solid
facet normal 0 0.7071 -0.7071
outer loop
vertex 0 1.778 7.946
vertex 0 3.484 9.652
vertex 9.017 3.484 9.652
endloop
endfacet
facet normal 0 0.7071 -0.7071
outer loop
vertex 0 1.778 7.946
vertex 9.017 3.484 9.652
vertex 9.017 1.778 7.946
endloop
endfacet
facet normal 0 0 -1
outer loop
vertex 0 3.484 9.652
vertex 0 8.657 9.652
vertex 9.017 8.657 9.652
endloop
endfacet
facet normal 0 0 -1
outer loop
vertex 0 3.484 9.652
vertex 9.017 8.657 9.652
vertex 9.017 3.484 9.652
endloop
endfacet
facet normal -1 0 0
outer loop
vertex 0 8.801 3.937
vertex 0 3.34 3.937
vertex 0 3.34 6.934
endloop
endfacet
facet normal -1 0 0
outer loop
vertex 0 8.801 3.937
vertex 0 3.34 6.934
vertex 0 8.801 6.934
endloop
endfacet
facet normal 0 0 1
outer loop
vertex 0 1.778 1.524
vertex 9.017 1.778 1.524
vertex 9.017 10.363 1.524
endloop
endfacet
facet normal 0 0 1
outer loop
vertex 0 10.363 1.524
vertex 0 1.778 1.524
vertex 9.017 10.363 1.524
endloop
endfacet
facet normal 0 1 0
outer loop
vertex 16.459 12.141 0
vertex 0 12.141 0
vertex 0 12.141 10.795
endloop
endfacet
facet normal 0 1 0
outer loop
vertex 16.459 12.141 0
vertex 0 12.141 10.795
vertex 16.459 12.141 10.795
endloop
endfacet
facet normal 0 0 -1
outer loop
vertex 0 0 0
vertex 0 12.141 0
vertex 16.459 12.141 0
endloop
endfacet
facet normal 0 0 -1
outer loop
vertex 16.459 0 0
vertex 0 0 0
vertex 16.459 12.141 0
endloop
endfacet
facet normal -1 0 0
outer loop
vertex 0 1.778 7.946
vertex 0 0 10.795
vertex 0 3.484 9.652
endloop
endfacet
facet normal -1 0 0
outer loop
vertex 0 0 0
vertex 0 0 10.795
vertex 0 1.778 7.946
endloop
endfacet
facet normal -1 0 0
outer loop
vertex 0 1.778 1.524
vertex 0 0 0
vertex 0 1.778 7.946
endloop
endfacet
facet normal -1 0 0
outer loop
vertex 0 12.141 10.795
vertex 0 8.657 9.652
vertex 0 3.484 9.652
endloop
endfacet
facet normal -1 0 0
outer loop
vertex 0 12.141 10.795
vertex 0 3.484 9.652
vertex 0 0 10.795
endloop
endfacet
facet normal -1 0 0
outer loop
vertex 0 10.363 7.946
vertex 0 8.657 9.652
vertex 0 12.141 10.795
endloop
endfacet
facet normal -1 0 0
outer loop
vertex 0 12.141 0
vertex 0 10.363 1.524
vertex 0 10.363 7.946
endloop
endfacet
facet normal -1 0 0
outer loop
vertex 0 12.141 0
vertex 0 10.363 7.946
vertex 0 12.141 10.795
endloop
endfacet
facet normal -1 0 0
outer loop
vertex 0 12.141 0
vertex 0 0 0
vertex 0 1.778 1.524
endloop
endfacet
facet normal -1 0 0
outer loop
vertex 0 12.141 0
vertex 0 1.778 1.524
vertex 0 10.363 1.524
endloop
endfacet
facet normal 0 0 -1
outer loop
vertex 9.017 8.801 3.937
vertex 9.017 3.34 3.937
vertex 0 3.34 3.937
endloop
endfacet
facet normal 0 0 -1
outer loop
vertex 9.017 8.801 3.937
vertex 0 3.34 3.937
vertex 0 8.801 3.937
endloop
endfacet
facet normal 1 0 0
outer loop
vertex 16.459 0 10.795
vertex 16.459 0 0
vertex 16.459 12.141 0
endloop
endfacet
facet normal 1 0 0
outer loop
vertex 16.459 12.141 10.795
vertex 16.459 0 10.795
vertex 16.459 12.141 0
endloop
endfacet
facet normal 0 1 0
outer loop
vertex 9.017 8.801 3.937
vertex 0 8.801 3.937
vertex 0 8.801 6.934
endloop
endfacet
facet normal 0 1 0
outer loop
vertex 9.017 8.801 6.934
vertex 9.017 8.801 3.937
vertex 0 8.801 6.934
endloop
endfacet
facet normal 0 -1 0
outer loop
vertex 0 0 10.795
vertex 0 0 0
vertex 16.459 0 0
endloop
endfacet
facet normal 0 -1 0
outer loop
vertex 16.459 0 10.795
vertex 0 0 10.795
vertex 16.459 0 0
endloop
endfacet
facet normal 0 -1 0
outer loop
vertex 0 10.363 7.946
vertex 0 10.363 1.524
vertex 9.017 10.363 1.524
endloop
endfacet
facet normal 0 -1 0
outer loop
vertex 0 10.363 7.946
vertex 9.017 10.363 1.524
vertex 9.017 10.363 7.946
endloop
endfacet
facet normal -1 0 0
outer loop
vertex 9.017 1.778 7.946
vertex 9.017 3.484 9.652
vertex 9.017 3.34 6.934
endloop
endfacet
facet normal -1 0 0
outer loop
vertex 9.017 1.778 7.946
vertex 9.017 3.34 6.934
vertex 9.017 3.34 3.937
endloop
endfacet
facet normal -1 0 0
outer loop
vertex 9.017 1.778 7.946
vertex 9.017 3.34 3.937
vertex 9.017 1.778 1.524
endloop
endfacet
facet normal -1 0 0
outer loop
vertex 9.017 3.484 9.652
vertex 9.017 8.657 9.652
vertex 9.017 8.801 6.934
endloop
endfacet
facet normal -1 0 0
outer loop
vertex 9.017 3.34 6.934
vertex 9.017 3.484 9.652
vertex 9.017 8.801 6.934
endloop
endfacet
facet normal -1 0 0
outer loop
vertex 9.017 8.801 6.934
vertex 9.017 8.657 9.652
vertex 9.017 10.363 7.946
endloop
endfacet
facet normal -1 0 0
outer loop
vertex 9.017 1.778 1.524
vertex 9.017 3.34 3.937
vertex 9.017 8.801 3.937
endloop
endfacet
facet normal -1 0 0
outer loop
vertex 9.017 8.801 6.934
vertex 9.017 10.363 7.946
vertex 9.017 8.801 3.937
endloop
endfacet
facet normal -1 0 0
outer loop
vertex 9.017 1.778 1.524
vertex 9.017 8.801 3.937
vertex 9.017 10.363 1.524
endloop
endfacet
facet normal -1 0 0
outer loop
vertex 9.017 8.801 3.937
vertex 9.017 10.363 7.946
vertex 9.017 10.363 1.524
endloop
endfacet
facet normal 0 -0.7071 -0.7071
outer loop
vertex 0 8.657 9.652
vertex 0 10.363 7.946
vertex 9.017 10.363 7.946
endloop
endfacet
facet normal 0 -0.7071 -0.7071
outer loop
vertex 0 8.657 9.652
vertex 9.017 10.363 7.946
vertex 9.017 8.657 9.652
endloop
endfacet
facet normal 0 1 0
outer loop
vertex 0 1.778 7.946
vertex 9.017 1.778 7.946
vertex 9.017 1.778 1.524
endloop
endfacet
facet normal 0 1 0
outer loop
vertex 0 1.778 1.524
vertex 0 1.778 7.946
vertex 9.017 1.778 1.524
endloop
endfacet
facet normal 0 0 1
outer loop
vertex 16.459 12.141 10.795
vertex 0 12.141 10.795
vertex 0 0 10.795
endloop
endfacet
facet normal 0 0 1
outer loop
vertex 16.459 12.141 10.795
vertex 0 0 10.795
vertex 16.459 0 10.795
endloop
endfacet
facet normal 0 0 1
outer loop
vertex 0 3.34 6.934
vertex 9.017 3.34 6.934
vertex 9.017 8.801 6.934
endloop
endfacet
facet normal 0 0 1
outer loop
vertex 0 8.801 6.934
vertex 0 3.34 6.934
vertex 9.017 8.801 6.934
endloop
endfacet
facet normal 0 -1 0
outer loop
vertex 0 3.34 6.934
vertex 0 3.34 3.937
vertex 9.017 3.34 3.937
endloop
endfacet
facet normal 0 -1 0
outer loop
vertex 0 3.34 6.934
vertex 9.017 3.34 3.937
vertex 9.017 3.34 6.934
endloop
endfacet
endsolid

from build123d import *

# Parameters (mm, degrees)
SKETCH1_W           = 16.4592
SKETCH1_H           = 12.1412
BOSS_EXTRUDE1_DEPTH = 10.795
SKETCH2_W           = 2.9972
SKETCH2_H           = 5.461
CUT_EXTRUDE1_DEPTH  = 9.017


with BuildPart() as part:
    # Sketch1 → Boss-Extrude1 (new body)
    with BuildSketch(Plane.XY):
        with Locations((8.2296, 6.0706)):
            Rectangle(SKETCH1_W, SKETCH1_H)
    extrude(amount=BOSS_EXTRUDE1_DEPTH)

    # Sketch2 → Cut-Extrude1 (cut)
    with BuildSketch(Plane.ZY):
        Polygon((1.524, 1.778), (1.524, 10.3632), (7.945751337, 10.3632), (9.652, 8.656951337), (9.652, 3.484248663), (7.945751337, 1.778), align=None)
        with Locations((5.4356, 6.0706)):
            Rectangle(SKETCH2_W, SKETCH2_H, mode=Mode.SUBTRACT)
    extrude(amount=-CUT_EXTRUDE1_DEPTH, mode=Mode.SUBTRACT)


solid = part.part
